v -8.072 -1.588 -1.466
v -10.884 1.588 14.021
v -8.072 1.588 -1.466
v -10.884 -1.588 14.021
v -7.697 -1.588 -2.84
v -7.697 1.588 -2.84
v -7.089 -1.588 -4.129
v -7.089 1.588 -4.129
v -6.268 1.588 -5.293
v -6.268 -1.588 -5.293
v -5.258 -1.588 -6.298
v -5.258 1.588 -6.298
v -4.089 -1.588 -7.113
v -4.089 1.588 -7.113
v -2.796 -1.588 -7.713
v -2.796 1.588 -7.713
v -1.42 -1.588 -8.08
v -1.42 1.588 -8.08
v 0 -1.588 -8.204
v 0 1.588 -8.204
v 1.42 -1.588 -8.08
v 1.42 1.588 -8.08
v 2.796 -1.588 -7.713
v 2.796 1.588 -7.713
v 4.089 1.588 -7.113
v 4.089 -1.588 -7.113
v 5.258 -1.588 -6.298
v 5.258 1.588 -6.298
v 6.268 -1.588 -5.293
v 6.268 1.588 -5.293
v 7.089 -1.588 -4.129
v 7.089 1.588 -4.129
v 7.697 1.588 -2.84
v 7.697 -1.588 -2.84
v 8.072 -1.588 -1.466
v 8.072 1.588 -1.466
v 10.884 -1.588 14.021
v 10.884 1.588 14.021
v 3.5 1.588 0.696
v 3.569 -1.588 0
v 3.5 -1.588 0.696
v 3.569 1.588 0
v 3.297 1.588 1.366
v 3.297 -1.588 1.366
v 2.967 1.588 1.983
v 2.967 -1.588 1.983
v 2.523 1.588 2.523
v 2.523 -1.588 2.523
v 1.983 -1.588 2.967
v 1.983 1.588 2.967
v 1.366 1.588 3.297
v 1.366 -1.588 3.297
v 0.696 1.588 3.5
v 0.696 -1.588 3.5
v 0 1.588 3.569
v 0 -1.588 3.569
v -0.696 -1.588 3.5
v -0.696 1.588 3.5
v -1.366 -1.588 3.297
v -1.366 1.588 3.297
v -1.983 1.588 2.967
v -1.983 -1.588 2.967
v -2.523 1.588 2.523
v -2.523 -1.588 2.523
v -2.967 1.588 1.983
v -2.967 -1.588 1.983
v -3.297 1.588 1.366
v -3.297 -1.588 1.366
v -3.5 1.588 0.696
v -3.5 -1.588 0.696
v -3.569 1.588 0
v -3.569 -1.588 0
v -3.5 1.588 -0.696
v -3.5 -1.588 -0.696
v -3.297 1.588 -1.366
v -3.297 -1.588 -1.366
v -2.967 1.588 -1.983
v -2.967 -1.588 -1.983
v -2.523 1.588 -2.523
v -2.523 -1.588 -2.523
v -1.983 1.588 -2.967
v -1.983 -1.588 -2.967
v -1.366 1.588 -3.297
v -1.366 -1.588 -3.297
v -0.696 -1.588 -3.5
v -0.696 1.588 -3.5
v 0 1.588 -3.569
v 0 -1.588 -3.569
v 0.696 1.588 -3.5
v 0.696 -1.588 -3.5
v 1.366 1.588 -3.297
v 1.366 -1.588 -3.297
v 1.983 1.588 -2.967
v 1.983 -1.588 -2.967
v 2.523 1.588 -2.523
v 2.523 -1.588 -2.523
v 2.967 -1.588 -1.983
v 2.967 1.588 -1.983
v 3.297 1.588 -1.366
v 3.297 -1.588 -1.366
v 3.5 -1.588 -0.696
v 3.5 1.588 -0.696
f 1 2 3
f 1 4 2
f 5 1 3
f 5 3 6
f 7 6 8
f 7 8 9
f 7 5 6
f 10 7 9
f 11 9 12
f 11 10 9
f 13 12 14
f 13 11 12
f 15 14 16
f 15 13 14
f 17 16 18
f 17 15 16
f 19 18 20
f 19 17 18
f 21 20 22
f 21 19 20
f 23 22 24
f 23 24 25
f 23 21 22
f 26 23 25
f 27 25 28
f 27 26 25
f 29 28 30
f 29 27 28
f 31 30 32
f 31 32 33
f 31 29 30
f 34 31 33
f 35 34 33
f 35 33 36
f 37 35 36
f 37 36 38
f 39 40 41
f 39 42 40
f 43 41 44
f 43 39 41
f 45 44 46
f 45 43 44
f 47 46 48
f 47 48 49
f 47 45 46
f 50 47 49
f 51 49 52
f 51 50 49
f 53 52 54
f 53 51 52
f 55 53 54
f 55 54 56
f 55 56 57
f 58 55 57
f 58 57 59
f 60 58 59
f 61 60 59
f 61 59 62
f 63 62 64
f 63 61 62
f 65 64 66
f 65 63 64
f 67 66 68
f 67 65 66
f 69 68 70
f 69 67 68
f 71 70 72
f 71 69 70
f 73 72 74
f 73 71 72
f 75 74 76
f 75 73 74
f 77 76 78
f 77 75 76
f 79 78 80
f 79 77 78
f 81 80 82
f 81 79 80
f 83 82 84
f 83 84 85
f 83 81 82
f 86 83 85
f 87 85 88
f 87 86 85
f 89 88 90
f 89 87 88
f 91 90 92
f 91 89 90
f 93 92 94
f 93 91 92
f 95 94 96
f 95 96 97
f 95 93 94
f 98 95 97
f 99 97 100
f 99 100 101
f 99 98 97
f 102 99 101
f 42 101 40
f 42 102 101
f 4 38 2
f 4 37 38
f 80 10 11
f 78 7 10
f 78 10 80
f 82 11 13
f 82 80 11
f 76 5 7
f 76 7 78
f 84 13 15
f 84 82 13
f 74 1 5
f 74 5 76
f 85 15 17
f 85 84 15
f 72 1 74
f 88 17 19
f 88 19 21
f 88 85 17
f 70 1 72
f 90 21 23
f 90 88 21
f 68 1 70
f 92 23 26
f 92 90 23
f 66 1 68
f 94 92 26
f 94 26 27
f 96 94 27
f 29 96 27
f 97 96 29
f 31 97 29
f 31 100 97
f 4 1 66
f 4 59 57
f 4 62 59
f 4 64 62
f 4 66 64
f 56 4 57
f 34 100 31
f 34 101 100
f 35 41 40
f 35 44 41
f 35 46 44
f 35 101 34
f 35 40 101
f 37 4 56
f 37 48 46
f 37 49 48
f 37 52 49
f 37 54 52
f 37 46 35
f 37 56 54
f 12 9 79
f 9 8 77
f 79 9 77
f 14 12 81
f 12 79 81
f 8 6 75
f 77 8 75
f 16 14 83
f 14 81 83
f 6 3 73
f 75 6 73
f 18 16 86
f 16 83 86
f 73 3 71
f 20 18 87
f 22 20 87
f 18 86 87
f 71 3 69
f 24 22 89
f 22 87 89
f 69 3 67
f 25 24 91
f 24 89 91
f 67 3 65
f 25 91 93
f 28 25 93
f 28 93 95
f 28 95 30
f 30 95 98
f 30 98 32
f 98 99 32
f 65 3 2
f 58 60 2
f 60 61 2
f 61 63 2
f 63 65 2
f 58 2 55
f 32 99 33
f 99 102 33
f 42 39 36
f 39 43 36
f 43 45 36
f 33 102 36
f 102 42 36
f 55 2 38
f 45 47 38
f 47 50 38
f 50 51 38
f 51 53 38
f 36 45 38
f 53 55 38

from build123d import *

# Parameters (mm, degrees)
F0_R     = 3.5687
F1_DEPTH = 1.5875


with BuildPart() as f1:
    # F0 (on Front) → F1 (new body, symmetric)
    with BuildSketch(Plane.XZ):
        with BuildLine():
            Line((-10.8839, 14.0208), (-8.0722359001, -1.4655733392))
            ThreePointArc((-8.0722359001, -1.4655733392), (0, -8.2042), (8.0722359001, -1.4655733392))
            Line((8.0722359001, -1.4655733392), (10.8839, 14.0208))
            Line((10.8839, 14.0208), (-10.8839, 14.0208))
        make_face()
        Circle(F0_R, mode=Mode.SUBTRACT)
    extrude(amount=F1_DEPTH, both=True)


solid = f1.part
